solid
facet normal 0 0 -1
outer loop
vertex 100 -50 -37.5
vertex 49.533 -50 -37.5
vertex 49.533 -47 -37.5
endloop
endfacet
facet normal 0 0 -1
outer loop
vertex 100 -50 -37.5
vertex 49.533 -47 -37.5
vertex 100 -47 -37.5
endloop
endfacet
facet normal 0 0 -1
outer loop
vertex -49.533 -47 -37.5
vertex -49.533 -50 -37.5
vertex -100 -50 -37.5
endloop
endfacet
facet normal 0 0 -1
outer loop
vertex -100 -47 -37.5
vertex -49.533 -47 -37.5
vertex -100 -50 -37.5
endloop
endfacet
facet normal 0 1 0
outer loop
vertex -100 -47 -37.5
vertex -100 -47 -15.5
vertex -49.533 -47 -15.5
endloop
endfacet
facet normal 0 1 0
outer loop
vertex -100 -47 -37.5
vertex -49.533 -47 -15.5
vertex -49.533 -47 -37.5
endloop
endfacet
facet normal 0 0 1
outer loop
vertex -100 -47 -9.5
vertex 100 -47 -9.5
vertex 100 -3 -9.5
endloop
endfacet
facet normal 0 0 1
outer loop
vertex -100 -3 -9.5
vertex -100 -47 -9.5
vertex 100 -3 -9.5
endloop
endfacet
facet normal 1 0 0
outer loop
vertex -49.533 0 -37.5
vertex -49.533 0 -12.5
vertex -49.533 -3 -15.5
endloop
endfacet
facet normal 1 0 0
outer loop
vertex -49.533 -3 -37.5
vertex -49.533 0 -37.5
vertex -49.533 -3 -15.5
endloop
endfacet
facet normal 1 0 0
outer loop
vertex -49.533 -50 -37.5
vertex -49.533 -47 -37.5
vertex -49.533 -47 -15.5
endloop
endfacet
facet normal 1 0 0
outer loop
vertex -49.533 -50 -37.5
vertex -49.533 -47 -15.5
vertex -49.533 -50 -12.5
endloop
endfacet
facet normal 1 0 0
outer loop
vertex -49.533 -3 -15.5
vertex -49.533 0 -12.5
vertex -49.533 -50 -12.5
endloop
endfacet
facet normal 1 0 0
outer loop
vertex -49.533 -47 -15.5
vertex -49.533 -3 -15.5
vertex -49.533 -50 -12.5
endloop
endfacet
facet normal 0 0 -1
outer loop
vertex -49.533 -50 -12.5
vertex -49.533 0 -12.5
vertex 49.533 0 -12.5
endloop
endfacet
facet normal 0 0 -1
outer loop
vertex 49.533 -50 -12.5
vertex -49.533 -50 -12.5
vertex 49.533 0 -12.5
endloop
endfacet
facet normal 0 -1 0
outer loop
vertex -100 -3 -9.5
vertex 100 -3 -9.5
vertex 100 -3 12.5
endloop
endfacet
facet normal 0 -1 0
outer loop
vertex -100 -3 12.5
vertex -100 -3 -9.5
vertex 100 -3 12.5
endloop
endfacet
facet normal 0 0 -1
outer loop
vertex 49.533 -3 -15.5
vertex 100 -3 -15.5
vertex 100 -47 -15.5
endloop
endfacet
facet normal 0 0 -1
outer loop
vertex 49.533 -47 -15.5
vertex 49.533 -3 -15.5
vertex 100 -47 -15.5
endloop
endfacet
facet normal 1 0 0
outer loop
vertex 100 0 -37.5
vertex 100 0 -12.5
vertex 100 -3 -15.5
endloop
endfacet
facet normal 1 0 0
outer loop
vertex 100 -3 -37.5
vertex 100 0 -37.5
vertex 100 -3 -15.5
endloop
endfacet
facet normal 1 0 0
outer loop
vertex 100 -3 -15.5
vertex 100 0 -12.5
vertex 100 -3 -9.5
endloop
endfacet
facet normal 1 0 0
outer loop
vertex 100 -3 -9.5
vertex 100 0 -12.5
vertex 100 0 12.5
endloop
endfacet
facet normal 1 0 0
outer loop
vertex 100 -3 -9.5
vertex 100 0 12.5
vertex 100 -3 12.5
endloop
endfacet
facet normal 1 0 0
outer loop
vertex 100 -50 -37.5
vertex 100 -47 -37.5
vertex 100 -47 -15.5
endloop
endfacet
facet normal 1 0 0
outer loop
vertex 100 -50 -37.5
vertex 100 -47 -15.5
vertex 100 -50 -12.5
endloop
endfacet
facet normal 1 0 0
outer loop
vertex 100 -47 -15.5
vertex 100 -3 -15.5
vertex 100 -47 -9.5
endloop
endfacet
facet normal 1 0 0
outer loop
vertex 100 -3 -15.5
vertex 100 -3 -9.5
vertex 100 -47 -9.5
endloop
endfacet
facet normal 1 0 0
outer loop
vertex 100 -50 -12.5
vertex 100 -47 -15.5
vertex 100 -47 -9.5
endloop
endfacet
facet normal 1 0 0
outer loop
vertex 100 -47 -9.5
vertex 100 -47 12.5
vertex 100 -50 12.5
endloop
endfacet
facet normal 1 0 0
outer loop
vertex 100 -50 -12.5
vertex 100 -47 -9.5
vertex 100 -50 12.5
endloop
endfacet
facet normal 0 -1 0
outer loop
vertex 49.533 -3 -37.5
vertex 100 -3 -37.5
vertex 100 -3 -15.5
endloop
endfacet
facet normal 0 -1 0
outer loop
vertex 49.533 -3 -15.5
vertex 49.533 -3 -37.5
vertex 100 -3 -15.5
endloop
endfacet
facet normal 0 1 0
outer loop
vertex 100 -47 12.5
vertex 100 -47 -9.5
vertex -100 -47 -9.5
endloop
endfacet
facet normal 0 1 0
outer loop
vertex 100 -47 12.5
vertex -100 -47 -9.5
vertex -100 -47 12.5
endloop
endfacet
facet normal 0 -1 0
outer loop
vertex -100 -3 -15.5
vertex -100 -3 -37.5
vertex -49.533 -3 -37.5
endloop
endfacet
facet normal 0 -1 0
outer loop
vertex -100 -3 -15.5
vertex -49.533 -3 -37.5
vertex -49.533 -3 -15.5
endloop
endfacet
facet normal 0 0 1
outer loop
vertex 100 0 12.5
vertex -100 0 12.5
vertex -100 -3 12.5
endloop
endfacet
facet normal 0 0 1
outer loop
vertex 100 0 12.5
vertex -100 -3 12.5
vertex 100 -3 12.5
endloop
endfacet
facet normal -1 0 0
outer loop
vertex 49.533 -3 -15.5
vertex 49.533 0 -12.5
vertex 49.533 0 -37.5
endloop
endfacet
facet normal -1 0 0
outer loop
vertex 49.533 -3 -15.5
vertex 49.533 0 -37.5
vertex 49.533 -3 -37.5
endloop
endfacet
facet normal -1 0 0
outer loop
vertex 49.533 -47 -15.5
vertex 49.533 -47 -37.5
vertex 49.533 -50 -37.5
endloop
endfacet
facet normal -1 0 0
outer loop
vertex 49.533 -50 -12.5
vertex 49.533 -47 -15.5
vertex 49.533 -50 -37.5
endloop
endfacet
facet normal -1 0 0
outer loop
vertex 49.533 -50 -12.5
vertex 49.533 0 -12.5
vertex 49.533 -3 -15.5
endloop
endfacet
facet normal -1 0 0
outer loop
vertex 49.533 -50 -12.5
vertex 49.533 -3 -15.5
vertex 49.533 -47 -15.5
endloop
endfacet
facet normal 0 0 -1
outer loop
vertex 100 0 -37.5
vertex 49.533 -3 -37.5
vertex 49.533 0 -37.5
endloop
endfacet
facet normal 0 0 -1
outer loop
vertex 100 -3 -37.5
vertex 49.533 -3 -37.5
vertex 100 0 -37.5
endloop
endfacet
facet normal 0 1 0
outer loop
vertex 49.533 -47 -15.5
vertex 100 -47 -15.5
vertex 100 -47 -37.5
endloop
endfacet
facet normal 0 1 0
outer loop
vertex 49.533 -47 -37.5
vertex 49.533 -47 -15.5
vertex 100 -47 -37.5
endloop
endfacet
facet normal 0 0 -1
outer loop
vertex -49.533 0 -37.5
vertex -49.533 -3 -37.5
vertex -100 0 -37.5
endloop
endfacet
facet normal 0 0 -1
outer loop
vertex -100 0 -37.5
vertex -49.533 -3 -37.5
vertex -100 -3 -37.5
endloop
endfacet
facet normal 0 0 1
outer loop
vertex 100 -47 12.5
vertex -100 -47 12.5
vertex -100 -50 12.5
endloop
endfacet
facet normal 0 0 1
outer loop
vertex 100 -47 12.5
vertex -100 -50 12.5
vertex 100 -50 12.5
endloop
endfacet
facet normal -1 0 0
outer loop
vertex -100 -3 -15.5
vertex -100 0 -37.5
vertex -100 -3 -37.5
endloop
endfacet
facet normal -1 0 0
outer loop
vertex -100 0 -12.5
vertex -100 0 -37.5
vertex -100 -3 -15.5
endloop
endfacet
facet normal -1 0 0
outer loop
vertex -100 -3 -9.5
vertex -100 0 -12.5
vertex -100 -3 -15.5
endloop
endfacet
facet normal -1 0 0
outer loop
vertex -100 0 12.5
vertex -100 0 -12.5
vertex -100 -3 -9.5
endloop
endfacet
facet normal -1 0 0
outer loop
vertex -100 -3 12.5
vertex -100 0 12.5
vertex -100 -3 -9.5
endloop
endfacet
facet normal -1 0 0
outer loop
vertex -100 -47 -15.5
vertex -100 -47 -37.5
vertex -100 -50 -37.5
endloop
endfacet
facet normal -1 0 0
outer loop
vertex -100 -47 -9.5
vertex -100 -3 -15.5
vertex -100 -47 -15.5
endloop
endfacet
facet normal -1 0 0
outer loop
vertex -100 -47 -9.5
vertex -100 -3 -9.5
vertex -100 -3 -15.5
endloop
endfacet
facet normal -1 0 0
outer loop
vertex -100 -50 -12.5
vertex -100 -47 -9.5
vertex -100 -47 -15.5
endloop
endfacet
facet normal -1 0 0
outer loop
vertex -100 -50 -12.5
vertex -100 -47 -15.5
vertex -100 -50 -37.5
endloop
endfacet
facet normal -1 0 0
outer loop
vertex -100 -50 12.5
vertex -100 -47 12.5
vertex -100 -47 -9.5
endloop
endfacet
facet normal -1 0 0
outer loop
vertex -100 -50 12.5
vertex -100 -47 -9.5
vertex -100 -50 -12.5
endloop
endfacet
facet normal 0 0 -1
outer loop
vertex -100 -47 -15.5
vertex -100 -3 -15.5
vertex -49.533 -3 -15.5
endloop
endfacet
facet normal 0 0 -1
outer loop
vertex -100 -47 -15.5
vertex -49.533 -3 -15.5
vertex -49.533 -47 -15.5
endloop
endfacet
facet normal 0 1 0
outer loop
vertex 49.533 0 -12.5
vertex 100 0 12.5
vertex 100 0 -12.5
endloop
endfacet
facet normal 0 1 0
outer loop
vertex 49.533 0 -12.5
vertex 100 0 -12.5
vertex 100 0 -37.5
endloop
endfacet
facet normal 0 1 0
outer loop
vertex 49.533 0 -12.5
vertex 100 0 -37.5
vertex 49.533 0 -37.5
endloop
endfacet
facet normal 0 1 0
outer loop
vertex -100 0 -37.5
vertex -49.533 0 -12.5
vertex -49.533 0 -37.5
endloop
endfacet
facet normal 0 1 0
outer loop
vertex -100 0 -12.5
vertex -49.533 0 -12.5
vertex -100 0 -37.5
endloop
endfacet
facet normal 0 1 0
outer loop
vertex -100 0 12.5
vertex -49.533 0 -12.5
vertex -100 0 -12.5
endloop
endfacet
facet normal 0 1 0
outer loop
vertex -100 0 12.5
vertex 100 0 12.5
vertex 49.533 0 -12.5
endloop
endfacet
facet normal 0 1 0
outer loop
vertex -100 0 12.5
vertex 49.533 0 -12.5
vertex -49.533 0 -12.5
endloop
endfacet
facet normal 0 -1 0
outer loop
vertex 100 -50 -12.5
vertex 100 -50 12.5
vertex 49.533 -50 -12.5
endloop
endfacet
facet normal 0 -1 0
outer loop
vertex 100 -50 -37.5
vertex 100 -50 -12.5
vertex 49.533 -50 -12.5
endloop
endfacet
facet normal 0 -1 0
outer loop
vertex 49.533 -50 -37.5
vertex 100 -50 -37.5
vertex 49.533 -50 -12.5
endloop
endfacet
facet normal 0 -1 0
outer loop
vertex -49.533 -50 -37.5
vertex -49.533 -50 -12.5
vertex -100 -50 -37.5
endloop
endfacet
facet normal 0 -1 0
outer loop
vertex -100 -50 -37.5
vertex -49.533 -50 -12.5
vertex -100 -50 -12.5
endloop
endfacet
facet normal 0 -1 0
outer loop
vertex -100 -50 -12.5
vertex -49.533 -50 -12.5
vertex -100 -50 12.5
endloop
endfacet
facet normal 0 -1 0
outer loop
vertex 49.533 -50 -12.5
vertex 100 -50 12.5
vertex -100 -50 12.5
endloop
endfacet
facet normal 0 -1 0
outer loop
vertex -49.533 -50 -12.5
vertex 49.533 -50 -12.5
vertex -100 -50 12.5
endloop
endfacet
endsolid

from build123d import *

# Parameters (mm, degrees)
F0_W     = 200
F0_H     = 25
F1_DEPTH = 50
F2_W     = 44
F2_H     = 22
F3_DEPTH = 100.001
F4_DEPTH = 100.001
F5_W     = 50.4667520523
F5_H     = 50
F6_DEPTH = 25
F8_DEPTH = 200.001


with BuildPart() as f1:
    # F0 (on Front) → F1 (new body)
    with BuildSketch(Plane.XZ):
        Rectangle(F0_W, F0_H)
    extrude(amount=F1_DEPTH)

    # F2 (on Right) → F3 (cut, through all)
    with BuildSketch(Plane.YZ):
        with Locations((-25, 1.5)):
            Rectangle(F2_W, F2_H)
    extrude(amount=F3_DEPTH, mode=Mode.SUBTRACT)

    # F2 (on Right) → F4 (cut, through all)
    with BuildSketch(Plane.YZ):
        with Locations((-25, 1.5)):
            Rectangle(F2_W, F2_H)
    extrude(amount=-F4_DEPTH, mode=Mode.SUBTRACT)

    # F5 (on face) → F6 (join)
    with BuildSketch(Plane(origin=(0, 0, -12.5), x_dir=(1, 0, 0), z_dir=(0, 0, -1))):
        with Locations((74.7666239738, 25)):
            Rectangle(F5_W, F5_H)
    extrude(amount=F6_DEPTH)

    # F7 (on face) → F8 (cut, through all)
    with BuildSketch(Plane.YZ.offset(100)):
        Polygon((-47, -31.9465436041), (-47, -37.5), (-3, -37.5), (-3, -31.9465436041), (-3, -15.5), (-24.8005185276, -15.5), (-47, -15.5), align=None)
    extrude(amount=-F8_DEPTH, mode=Mode.SUBTRACT)

    # F9: F1 across plane


with BuildPart() as f1_1:
    add(f1.part)
    add(f1.part.mirror(Plane.YZ))


solid = f1_1.part
